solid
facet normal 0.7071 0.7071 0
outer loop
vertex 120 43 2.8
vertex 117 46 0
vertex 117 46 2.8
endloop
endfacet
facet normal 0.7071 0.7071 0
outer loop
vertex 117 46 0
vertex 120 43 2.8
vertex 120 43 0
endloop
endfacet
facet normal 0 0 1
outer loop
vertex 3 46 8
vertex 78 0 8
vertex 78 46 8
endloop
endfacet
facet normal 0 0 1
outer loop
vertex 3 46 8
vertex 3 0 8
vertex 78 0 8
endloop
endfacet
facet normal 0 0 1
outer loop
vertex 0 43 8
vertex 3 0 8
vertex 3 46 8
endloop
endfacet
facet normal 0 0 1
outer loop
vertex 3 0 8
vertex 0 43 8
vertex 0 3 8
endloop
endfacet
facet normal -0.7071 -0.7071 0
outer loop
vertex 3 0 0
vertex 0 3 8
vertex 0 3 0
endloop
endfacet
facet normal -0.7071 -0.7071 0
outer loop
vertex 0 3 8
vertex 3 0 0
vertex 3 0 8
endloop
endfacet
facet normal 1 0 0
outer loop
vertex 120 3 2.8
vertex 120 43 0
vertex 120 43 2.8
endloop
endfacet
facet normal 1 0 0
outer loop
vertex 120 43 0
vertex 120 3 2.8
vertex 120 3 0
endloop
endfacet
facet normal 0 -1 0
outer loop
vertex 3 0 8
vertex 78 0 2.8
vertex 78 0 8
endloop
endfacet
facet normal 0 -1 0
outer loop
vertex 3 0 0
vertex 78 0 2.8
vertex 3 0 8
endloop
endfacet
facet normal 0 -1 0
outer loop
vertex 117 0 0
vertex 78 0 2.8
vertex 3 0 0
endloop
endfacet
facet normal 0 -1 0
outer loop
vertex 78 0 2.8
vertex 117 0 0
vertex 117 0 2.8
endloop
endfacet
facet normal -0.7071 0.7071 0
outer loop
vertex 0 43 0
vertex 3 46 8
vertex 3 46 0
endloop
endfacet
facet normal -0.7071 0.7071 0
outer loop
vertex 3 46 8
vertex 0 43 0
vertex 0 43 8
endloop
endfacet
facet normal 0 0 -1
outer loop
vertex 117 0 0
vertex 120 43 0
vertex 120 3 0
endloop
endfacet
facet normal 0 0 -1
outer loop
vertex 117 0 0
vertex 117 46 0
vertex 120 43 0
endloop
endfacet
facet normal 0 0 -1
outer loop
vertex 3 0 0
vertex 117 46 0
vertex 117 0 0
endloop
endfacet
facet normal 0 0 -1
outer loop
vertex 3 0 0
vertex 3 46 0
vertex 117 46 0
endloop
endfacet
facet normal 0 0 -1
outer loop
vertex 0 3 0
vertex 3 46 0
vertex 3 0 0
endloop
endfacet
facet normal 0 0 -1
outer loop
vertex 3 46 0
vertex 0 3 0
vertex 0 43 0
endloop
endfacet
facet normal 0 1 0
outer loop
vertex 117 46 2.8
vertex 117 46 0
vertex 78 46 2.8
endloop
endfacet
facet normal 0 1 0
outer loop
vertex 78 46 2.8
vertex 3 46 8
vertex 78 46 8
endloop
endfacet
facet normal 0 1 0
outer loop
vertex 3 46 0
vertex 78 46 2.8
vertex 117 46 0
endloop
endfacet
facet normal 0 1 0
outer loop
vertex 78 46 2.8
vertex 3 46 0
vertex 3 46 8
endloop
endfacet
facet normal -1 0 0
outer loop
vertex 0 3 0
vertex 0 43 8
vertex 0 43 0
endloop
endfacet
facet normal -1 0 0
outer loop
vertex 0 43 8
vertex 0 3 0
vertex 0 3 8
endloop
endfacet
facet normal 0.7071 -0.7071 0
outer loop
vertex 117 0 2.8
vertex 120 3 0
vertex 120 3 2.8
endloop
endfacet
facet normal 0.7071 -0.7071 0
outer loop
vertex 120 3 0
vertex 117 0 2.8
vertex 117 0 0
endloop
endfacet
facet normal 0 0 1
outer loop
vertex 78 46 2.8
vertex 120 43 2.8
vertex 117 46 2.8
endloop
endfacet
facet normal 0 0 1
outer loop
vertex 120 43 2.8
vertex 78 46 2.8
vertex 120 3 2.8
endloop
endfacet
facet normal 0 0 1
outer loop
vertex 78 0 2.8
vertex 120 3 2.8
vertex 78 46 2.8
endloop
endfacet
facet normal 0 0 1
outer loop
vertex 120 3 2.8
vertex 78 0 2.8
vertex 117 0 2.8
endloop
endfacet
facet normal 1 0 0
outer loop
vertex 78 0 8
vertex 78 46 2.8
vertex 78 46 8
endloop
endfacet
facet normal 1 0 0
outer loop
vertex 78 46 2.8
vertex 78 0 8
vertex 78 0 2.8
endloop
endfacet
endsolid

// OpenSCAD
$fn = 32;

// ----------------------------------------------------------------------
// Stepped bar: endstep, 120 x 46 x 8/2.8 mm
// ----------------------------------------------------------------------

// --- parameters (mm) ---
bar_l = 120;              // bar length, X
bar_w = 46;               // bar width, Y
plate_t = 8;              // thickness of the thick zone, Z
thin_t = 2.8;             // thickness of the thin zone
corner_c = 3;             // corner chamfer of the bar
step_cut = 5.2;           // material removed from the thin zone
step_x = 78;              // step position from the left end
depth_1 = 5.2;            // depth of cut 1 from the top face

profile = [[3, 0], [117, 0], [120, 3], [120, 43], [117, 46], [3, 46], [0, 43], [0, 3]];  // primary outline, 8 points, counter clockwise
void_1 = [[78, -1], [121, -1], [121, 47], [78, 47]];  // thin zone beyond the step, 4 points

// --- the one profile operation ---
difference() {
  linear_extrude(height = plate_t) polygon(points = profile);
  translate([0, 0, plate_t - depth_1])
    linear_extrude(height = depth_1 + 1) polygon(points = void_1);
}
